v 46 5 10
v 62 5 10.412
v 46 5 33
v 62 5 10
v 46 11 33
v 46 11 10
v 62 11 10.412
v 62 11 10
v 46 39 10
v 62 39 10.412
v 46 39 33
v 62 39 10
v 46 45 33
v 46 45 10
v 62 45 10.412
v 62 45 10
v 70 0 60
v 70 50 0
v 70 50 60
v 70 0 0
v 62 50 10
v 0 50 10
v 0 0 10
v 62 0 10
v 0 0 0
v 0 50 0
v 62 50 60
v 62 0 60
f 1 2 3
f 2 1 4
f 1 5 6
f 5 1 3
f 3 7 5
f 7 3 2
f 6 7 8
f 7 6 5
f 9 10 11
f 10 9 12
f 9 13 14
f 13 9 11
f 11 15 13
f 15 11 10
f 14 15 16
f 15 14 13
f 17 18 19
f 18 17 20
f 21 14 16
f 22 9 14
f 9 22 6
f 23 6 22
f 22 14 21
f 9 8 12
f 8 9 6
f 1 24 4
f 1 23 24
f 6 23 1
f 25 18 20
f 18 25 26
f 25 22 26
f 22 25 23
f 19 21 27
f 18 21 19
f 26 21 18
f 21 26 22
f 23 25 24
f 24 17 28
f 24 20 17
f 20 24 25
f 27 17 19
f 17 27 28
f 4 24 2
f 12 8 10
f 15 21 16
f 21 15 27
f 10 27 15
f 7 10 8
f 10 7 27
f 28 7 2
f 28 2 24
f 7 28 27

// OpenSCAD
$fn = 32;

// ----------------------------------------------------------------------
// Rib bracket: 2-gusset L bracket
// ----------------------------------------------------------------------

// --- parameters (mm) ---
base_l = 70;              // foot length, X
base_w = 50;              // foot width, Y
base_t = 10;              // foot thickness
plate_t = 8;              // upright plate thickness
plate_h = 60;             // overall height
gus_l = 16;               // gusset leg along the foot
gus_h = 24;               // gusset height
gus_t = 6;                // gusset thickness
gus_edge = 5;             // gusset margin from the foot edge
n_gus = 2;                // gusset count

gus_pitch = (base_w - 2 * gus_edge - gus_t) / (n_gus - 1);  // gusset pitch

union() {
  cube([base_l, base_w, base_t]);
  translate([base_l - plate_t, 0, base_t - 1])
    cube([plate_t, base_w, plate_h - base_t + 1]);
  for (i = [0 : n_gus - 1])
    translate([base_l - plate_t - gus_l, gus_edge + i * gus_pitch, base_t - 1])
      rotate([-90, 0, 0])
        linear_extrude(height = gus_t)
          polygon(points = [[0, 0], [gus_l + 1, 0], [0, -gus_h]]);
}
